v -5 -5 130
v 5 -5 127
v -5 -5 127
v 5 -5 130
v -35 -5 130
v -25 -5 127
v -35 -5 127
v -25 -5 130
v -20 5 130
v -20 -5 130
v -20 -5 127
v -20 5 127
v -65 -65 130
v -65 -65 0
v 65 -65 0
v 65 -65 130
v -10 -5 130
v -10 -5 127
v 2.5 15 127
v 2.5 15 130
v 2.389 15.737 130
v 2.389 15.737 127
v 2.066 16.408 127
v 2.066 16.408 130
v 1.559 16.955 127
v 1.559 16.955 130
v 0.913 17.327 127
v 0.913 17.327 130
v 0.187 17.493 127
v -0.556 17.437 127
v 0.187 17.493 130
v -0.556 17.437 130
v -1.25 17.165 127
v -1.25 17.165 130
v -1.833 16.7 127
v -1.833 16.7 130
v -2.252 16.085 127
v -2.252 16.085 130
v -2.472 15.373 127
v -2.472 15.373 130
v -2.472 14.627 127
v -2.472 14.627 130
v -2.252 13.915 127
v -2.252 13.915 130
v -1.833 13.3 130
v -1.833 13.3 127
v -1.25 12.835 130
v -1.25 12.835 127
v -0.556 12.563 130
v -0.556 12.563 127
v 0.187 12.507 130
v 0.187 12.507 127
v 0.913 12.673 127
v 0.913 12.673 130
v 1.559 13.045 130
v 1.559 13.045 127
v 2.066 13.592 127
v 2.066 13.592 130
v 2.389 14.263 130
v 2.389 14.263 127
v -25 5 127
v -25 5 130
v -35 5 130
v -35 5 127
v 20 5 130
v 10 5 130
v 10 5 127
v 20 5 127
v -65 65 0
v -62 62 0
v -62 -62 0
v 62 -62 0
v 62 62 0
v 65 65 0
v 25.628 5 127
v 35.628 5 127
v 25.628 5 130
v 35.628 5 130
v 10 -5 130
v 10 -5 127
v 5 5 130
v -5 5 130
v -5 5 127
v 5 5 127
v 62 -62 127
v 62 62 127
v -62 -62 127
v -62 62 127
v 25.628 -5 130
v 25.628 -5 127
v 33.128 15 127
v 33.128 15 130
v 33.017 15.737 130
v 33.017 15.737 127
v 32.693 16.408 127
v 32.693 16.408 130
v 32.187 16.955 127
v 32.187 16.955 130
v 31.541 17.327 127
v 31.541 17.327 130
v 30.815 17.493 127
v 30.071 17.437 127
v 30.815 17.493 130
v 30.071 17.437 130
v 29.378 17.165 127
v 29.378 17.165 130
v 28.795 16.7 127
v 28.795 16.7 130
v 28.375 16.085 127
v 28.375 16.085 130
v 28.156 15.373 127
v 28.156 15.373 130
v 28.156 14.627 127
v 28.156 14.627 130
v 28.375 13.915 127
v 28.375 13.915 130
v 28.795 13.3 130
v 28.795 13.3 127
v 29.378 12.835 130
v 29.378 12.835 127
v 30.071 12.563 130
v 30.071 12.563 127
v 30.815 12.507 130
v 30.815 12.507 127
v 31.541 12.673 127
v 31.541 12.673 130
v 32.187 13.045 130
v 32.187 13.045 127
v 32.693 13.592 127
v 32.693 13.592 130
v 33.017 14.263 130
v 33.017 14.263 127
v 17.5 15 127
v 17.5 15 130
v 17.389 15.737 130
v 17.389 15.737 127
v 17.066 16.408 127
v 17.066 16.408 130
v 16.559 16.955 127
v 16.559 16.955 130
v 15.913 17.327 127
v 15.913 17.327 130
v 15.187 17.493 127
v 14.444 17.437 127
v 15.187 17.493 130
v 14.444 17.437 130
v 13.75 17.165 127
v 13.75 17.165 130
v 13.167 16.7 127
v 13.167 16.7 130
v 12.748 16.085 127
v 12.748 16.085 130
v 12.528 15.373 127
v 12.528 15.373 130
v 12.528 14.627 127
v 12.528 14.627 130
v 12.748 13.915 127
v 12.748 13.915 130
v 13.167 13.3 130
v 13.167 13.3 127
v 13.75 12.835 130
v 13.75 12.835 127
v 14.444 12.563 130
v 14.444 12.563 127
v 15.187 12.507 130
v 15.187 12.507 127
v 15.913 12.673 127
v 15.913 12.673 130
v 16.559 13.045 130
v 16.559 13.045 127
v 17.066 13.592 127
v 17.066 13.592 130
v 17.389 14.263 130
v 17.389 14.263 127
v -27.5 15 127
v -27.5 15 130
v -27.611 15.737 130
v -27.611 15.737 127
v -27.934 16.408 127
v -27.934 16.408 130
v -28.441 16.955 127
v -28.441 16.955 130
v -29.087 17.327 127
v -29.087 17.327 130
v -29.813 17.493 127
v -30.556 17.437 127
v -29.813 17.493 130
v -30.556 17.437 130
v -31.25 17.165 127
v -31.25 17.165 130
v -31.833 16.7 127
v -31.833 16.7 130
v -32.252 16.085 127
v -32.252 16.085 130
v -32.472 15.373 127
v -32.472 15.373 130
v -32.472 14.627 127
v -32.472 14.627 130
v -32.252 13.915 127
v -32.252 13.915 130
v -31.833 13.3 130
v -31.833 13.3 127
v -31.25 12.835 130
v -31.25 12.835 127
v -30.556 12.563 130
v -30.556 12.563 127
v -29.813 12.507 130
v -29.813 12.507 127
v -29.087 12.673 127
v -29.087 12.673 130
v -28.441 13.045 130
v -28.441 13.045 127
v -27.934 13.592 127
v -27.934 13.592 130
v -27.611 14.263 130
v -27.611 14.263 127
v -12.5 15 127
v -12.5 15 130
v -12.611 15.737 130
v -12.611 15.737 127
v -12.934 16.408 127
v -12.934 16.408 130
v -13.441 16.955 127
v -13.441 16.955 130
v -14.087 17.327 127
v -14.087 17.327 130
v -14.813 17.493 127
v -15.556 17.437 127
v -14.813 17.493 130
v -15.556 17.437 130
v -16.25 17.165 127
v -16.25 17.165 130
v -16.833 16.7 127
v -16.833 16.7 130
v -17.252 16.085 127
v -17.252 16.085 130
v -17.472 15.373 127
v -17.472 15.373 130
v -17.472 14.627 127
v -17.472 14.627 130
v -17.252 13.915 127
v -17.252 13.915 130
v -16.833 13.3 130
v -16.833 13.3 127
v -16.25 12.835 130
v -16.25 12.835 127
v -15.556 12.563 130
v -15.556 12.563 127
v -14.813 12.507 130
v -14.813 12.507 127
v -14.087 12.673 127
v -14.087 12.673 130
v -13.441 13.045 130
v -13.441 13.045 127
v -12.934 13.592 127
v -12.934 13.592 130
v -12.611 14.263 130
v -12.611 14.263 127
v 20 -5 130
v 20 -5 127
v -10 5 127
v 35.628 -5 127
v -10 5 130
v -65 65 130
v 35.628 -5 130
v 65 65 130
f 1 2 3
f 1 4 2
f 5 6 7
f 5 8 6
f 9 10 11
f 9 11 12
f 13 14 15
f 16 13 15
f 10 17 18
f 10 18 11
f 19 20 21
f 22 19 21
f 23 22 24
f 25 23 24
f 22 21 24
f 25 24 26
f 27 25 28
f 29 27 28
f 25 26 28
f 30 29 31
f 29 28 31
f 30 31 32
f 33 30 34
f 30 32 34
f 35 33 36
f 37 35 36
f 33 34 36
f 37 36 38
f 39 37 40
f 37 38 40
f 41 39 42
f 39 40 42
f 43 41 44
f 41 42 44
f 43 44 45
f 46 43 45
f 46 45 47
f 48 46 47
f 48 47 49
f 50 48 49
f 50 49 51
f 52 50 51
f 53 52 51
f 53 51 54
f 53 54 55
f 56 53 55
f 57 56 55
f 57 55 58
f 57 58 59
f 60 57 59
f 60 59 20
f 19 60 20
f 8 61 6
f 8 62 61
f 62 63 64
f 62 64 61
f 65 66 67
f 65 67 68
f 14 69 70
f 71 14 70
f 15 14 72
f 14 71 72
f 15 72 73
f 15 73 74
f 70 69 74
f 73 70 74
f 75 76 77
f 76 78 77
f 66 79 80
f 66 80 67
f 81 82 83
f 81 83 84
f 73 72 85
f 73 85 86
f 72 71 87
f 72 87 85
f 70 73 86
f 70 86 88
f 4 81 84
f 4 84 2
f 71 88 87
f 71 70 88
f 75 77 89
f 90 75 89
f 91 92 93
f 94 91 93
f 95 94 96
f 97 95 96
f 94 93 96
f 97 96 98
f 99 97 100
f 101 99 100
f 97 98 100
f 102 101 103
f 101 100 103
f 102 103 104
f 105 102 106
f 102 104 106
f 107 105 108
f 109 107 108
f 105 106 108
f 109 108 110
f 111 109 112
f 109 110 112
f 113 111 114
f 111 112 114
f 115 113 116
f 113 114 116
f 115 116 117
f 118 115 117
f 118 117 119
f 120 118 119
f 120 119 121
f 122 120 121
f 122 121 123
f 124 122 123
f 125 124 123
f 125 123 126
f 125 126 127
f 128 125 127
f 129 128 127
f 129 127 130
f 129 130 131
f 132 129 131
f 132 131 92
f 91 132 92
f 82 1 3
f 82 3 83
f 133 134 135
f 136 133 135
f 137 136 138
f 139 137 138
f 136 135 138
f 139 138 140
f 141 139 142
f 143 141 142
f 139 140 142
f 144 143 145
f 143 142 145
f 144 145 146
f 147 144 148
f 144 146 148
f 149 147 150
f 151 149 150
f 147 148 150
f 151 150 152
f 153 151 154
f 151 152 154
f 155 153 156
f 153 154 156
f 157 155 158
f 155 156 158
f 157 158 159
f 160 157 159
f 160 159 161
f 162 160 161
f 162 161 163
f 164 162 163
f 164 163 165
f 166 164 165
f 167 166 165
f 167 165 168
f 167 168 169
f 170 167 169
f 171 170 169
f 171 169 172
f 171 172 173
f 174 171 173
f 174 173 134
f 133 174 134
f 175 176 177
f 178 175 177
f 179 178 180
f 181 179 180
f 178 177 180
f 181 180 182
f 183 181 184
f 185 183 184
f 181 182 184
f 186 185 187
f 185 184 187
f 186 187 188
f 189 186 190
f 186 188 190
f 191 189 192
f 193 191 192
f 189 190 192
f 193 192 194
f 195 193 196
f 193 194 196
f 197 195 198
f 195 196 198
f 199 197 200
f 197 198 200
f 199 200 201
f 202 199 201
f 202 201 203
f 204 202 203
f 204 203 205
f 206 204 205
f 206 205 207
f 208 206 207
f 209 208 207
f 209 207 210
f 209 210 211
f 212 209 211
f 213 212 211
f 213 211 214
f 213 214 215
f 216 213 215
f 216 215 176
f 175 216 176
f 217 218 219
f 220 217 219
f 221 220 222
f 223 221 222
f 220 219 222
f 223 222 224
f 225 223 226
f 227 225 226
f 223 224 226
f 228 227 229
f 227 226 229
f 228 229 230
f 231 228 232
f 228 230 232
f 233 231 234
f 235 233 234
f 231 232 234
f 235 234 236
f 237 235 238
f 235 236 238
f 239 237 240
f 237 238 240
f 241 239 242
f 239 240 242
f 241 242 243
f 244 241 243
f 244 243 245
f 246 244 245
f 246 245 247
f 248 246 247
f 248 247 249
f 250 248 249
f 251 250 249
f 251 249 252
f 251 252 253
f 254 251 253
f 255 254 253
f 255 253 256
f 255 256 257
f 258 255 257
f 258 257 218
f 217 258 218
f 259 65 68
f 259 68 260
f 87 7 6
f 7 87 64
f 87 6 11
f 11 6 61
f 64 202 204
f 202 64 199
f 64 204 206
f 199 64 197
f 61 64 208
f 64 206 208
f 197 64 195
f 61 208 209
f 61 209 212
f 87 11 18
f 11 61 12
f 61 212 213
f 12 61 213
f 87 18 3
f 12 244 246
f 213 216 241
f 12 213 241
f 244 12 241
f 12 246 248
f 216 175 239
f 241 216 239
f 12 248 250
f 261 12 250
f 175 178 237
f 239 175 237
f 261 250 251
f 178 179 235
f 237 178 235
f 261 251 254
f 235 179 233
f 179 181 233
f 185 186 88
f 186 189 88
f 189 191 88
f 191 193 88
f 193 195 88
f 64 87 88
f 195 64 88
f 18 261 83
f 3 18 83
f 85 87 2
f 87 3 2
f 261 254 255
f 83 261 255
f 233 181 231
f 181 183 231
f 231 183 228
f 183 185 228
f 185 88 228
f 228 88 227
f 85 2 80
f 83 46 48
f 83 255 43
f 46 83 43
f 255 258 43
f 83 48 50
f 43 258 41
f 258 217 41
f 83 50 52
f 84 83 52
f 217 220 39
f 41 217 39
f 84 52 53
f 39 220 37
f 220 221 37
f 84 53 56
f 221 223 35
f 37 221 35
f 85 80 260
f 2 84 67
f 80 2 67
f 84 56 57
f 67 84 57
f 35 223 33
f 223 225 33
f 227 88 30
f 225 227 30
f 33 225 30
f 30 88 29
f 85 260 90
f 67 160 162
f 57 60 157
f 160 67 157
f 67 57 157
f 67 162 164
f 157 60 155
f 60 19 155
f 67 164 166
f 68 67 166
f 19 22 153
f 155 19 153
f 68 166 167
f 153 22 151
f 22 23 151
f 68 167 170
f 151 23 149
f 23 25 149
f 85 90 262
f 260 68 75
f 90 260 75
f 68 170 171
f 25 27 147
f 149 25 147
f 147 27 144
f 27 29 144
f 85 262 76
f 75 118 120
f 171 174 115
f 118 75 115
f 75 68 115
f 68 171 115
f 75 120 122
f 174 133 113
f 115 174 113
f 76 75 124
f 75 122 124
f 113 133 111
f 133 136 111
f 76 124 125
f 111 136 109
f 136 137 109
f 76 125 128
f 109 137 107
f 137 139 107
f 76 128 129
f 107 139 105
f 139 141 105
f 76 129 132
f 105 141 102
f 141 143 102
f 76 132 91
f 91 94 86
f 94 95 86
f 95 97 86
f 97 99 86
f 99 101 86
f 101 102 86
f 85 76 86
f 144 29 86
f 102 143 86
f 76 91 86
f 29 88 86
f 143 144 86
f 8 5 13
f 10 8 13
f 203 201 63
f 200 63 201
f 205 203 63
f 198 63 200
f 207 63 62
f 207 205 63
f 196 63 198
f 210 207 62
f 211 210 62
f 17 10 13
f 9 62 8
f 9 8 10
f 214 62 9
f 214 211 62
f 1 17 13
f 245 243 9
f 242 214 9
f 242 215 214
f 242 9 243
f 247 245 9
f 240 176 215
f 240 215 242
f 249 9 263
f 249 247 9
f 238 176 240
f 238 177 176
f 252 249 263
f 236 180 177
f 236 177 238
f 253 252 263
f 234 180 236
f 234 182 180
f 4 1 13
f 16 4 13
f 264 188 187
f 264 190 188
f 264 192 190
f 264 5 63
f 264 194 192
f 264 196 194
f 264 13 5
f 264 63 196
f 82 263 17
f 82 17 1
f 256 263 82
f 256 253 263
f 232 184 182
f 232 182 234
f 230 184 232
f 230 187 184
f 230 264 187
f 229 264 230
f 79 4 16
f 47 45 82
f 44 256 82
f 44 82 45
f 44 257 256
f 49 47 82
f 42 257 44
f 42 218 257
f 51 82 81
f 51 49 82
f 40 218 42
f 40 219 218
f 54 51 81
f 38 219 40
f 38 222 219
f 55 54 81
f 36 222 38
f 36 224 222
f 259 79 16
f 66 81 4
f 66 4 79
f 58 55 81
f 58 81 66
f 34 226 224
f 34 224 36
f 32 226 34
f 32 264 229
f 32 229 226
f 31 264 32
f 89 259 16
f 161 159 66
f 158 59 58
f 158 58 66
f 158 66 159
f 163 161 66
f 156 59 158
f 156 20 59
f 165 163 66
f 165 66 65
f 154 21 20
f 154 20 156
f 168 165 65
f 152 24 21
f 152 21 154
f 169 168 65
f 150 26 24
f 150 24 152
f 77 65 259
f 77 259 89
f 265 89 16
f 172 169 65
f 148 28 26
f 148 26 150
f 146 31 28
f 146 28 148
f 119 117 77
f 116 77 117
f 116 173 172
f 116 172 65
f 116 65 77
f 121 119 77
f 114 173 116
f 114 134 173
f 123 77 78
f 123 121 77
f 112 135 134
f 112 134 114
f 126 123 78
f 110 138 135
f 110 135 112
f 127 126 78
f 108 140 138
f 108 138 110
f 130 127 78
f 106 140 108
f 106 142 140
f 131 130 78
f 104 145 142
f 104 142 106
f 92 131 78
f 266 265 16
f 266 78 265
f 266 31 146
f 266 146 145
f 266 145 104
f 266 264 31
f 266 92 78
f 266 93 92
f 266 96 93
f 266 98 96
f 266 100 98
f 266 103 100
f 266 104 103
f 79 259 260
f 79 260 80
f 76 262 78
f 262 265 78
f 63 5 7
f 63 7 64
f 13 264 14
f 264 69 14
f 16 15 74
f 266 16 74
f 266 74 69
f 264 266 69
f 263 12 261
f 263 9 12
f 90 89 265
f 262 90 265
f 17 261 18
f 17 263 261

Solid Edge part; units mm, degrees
sketch "Sketch1" plane through (0, 0, 0) normal (0, 0, 1) x (1, 0, 0)
  line L0 (-65, -65) -> (65, -65)
  line L1 (65, -65) -> (65, 65)
  line L2 (65, 65) -> (-65, 65)
  line L3 (-65, 65) -> (-65, -65)
extrude "Protrusion1" add sketch "Sketch1" along normal blind 130
shell "Thinwall1" thickness 3 removed faces 1 at (-44.6333, -42.0333, 0)
sketch "Sketch2" plane through (0, 0, 130) normal (0, 0, 1) x (1, 0, 0)
  line L0 (-35, 5) -> (-25, 5)
  line L1 (-25, 5) -> (-25, -5)
  line L2 (-25, -5) -> (-35, -5)
  line L3 (-35, -5) -> (-35, 5)
  line L4 (-20, 5) -> (-10, 5)
  line L5 (-10, 5) -> (-10, -5)
  line L6 (-10, -5) -> (-20, -5)
  line L7 (-20, -5) -> (-20, 5)
  circle A0 centre (-15, 15) radius 2.5
  circle A1 centre (-30, 15) radius 2.5
  circle A2 centre (0, 15) radius 2.5
  line L8 (-5, 5) -> (5, 5)
  line L9 (5, 5) -> (5, -5)
  line L10 (5, -5) -> (-5, -5)
  line L11 (-5, -5) -> (-5, 5)
  circle A3 centre (15, 15) radius 2.5
  line L12 (10, 5) -> (20, 5)
  line L13 (20, 5) -> (20, -5)
  line L14 (20, -5) -> (10, -5)
  line L15 (10, -5) -> (10, 5)
  circle A4 centre (30.6278, 15) radius 2.5
  line L16 (35.6278, 5) -> (25.6278, 5)
  line L17 (25.6278, 5) -> (25.6278, -5)
  line L18 (25.6278, -5) -> (35.6278, -5)
  line L19 (35.6278, -5) -> (35.6278, 5)
extrude "Cutout1" cut sketch "Sketch2" against normal up to next
